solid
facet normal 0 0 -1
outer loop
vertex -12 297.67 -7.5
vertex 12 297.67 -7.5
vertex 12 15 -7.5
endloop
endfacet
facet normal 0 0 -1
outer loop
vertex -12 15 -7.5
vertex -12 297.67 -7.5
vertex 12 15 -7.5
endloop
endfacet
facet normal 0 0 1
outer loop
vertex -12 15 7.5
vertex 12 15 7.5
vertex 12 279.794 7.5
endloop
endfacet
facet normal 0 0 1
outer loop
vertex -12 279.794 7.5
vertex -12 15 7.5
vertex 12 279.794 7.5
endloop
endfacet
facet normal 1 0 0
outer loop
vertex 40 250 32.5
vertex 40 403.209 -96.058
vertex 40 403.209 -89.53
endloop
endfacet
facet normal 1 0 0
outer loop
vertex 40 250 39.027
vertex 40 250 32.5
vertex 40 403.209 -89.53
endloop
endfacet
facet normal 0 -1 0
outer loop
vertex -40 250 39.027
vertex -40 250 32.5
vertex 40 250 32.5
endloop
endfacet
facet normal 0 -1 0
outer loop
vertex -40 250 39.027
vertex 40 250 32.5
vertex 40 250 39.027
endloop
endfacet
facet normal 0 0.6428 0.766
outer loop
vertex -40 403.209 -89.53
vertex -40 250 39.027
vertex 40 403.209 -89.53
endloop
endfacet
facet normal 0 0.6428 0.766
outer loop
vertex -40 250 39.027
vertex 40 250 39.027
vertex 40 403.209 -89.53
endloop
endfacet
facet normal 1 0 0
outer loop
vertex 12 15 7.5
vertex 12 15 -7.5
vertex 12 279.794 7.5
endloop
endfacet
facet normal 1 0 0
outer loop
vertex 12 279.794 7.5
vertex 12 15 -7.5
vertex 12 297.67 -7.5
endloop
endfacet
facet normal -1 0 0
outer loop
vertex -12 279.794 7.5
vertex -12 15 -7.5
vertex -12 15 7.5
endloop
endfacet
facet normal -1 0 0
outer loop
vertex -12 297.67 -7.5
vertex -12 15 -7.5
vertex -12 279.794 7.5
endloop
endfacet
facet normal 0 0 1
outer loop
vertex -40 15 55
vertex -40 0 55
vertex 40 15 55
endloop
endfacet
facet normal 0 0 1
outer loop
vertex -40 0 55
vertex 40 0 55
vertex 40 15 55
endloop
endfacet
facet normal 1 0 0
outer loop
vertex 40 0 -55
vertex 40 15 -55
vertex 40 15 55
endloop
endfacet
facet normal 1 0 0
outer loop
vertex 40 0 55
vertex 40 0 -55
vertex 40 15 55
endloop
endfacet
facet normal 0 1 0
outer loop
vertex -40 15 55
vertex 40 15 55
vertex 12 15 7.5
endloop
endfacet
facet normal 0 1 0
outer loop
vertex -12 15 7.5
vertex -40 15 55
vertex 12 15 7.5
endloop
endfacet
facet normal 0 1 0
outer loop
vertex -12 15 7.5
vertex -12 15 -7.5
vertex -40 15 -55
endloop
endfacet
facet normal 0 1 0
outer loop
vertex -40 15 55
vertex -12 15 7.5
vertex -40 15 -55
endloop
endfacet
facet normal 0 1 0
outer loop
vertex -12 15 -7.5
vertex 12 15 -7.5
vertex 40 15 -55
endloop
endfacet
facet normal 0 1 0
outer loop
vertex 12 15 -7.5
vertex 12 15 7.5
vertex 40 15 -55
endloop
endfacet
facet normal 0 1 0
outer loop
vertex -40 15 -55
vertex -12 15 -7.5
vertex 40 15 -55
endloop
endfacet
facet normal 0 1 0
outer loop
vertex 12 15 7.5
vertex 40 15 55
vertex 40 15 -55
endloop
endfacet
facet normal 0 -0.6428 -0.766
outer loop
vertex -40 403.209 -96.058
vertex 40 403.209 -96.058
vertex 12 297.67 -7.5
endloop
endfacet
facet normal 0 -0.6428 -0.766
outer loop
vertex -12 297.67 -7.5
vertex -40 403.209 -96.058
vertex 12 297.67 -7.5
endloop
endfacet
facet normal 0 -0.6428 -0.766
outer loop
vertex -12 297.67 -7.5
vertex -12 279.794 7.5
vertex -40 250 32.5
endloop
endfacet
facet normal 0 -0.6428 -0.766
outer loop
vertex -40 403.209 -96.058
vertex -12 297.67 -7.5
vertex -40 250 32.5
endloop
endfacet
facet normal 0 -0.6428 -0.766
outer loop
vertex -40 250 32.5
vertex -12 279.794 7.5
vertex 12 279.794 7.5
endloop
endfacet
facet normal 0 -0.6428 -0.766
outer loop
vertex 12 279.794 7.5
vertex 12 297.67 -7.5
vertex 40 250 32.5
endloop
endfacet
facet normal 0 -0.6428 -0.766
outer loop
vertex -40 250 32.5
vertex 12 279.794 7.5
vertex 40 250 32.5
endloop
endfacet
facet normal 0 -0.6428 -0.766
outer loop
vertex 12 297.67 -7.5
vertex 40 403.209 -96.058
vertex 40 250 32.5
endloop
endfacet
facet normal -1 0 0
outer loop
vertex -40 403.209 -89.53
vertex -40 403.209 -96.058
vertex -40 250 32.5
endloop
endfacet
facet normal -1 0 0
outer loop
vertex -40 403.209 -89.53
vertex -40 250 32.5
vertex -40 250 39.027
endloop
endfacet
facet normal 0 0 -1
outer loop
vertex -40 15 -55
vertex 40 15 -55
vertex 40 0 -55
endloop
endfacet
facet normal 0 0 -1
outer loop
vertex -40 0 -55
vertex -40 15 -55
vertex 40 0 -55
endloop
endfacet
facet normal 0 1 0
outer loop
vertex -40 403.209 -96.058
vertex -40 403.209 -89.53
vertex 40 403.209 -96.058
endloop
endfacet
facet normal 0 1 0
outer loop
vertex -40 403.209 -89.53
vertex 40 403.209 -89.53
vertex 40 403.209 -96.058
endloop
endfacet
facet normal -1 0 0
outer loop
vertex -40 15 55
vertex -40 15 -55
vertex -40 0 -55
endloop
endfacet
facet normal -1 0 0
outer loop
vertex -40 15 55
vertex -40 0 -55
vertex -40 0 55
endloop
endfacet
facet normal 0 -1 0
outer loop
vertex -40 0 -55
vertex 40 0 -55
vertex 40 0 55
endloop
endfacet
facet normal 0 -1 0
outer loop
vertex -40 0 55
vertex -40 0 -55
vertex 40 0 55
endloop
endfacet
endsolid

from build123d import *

# Parameters (mm, degrees)
EXTRUDE_1_DEPTH     = 40
CUT_EXTRUDE_1_DEPTH = 28


with BuildPart() as part:
    # 草图1 → 凸台-拉伸1 (new, symmetric)
    with BuildSketch(Plane(origin=(0, 0, 0), x_dir=(0, 0, -1), z_dir=(1, 0, 0))):
        Polygon((55, 0), (-55, 0), (-55, 15), (-7.5, 15), (-7.5, 279.793839815), (-32.5, 250), (-39.027036447, 250), (89.530485491, 403.208888624), (96.057521937, 403.208888624), (7.5, 297.670143704), (7.5, 15), (55, 15), align=None)
    extrude(amount=EXTRUDE_1_DEPTH, both=True)

    # 草图2 → 切除-拉伸1 (cut)
    with BuildSketch(Plane(origin=(40, 0, 0), x_dir=(0, 0, -1), z_dir=(1, 0, 0))):
        Polygon((-7.5, 279.793839815), (7.5, 297.670143704), (7.5, 15), (-7.5, 15), align=None)
    cut_extrude_1 = extrude(amount=-CUT_EXTRUDE_1_DEPTH, mode=Mode.SUBTRACT)

    # 镜向1: 切除-拉伸1 across plane
    add(cut_extrude_1.mirror(Plane(origin=(0, 0, 0), x_dir=(0, 0, 1), z_dir=(1, 0, 0))), mode=Mode.SUBTRACT)


solid = part.part
